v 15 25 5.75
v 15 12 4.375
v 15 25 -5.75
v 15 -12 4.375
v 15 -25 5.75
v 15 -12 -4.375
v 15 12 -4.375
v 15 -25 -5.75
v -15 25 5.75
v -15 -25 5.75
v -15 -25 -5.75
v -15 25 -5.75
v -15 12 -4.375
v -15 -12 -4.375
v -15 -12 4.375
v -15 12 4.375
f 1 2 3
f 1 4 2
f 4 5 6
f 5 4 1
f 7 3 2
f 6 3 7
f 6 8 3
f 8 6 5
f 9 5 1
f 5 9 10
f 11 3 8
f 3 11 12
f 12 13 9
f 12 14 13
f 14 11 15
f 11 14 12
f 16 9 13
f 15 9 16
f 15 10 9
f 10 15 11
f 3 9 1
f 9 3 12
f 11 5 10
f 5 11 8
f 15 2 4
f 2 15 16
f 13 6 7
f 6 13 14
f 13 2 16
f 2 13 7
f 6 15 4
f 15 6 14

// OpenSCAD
difference()
{cube ([30,50,11.5],center=true);
  
cube([30,24,8.75],center=true
   ); };
;
